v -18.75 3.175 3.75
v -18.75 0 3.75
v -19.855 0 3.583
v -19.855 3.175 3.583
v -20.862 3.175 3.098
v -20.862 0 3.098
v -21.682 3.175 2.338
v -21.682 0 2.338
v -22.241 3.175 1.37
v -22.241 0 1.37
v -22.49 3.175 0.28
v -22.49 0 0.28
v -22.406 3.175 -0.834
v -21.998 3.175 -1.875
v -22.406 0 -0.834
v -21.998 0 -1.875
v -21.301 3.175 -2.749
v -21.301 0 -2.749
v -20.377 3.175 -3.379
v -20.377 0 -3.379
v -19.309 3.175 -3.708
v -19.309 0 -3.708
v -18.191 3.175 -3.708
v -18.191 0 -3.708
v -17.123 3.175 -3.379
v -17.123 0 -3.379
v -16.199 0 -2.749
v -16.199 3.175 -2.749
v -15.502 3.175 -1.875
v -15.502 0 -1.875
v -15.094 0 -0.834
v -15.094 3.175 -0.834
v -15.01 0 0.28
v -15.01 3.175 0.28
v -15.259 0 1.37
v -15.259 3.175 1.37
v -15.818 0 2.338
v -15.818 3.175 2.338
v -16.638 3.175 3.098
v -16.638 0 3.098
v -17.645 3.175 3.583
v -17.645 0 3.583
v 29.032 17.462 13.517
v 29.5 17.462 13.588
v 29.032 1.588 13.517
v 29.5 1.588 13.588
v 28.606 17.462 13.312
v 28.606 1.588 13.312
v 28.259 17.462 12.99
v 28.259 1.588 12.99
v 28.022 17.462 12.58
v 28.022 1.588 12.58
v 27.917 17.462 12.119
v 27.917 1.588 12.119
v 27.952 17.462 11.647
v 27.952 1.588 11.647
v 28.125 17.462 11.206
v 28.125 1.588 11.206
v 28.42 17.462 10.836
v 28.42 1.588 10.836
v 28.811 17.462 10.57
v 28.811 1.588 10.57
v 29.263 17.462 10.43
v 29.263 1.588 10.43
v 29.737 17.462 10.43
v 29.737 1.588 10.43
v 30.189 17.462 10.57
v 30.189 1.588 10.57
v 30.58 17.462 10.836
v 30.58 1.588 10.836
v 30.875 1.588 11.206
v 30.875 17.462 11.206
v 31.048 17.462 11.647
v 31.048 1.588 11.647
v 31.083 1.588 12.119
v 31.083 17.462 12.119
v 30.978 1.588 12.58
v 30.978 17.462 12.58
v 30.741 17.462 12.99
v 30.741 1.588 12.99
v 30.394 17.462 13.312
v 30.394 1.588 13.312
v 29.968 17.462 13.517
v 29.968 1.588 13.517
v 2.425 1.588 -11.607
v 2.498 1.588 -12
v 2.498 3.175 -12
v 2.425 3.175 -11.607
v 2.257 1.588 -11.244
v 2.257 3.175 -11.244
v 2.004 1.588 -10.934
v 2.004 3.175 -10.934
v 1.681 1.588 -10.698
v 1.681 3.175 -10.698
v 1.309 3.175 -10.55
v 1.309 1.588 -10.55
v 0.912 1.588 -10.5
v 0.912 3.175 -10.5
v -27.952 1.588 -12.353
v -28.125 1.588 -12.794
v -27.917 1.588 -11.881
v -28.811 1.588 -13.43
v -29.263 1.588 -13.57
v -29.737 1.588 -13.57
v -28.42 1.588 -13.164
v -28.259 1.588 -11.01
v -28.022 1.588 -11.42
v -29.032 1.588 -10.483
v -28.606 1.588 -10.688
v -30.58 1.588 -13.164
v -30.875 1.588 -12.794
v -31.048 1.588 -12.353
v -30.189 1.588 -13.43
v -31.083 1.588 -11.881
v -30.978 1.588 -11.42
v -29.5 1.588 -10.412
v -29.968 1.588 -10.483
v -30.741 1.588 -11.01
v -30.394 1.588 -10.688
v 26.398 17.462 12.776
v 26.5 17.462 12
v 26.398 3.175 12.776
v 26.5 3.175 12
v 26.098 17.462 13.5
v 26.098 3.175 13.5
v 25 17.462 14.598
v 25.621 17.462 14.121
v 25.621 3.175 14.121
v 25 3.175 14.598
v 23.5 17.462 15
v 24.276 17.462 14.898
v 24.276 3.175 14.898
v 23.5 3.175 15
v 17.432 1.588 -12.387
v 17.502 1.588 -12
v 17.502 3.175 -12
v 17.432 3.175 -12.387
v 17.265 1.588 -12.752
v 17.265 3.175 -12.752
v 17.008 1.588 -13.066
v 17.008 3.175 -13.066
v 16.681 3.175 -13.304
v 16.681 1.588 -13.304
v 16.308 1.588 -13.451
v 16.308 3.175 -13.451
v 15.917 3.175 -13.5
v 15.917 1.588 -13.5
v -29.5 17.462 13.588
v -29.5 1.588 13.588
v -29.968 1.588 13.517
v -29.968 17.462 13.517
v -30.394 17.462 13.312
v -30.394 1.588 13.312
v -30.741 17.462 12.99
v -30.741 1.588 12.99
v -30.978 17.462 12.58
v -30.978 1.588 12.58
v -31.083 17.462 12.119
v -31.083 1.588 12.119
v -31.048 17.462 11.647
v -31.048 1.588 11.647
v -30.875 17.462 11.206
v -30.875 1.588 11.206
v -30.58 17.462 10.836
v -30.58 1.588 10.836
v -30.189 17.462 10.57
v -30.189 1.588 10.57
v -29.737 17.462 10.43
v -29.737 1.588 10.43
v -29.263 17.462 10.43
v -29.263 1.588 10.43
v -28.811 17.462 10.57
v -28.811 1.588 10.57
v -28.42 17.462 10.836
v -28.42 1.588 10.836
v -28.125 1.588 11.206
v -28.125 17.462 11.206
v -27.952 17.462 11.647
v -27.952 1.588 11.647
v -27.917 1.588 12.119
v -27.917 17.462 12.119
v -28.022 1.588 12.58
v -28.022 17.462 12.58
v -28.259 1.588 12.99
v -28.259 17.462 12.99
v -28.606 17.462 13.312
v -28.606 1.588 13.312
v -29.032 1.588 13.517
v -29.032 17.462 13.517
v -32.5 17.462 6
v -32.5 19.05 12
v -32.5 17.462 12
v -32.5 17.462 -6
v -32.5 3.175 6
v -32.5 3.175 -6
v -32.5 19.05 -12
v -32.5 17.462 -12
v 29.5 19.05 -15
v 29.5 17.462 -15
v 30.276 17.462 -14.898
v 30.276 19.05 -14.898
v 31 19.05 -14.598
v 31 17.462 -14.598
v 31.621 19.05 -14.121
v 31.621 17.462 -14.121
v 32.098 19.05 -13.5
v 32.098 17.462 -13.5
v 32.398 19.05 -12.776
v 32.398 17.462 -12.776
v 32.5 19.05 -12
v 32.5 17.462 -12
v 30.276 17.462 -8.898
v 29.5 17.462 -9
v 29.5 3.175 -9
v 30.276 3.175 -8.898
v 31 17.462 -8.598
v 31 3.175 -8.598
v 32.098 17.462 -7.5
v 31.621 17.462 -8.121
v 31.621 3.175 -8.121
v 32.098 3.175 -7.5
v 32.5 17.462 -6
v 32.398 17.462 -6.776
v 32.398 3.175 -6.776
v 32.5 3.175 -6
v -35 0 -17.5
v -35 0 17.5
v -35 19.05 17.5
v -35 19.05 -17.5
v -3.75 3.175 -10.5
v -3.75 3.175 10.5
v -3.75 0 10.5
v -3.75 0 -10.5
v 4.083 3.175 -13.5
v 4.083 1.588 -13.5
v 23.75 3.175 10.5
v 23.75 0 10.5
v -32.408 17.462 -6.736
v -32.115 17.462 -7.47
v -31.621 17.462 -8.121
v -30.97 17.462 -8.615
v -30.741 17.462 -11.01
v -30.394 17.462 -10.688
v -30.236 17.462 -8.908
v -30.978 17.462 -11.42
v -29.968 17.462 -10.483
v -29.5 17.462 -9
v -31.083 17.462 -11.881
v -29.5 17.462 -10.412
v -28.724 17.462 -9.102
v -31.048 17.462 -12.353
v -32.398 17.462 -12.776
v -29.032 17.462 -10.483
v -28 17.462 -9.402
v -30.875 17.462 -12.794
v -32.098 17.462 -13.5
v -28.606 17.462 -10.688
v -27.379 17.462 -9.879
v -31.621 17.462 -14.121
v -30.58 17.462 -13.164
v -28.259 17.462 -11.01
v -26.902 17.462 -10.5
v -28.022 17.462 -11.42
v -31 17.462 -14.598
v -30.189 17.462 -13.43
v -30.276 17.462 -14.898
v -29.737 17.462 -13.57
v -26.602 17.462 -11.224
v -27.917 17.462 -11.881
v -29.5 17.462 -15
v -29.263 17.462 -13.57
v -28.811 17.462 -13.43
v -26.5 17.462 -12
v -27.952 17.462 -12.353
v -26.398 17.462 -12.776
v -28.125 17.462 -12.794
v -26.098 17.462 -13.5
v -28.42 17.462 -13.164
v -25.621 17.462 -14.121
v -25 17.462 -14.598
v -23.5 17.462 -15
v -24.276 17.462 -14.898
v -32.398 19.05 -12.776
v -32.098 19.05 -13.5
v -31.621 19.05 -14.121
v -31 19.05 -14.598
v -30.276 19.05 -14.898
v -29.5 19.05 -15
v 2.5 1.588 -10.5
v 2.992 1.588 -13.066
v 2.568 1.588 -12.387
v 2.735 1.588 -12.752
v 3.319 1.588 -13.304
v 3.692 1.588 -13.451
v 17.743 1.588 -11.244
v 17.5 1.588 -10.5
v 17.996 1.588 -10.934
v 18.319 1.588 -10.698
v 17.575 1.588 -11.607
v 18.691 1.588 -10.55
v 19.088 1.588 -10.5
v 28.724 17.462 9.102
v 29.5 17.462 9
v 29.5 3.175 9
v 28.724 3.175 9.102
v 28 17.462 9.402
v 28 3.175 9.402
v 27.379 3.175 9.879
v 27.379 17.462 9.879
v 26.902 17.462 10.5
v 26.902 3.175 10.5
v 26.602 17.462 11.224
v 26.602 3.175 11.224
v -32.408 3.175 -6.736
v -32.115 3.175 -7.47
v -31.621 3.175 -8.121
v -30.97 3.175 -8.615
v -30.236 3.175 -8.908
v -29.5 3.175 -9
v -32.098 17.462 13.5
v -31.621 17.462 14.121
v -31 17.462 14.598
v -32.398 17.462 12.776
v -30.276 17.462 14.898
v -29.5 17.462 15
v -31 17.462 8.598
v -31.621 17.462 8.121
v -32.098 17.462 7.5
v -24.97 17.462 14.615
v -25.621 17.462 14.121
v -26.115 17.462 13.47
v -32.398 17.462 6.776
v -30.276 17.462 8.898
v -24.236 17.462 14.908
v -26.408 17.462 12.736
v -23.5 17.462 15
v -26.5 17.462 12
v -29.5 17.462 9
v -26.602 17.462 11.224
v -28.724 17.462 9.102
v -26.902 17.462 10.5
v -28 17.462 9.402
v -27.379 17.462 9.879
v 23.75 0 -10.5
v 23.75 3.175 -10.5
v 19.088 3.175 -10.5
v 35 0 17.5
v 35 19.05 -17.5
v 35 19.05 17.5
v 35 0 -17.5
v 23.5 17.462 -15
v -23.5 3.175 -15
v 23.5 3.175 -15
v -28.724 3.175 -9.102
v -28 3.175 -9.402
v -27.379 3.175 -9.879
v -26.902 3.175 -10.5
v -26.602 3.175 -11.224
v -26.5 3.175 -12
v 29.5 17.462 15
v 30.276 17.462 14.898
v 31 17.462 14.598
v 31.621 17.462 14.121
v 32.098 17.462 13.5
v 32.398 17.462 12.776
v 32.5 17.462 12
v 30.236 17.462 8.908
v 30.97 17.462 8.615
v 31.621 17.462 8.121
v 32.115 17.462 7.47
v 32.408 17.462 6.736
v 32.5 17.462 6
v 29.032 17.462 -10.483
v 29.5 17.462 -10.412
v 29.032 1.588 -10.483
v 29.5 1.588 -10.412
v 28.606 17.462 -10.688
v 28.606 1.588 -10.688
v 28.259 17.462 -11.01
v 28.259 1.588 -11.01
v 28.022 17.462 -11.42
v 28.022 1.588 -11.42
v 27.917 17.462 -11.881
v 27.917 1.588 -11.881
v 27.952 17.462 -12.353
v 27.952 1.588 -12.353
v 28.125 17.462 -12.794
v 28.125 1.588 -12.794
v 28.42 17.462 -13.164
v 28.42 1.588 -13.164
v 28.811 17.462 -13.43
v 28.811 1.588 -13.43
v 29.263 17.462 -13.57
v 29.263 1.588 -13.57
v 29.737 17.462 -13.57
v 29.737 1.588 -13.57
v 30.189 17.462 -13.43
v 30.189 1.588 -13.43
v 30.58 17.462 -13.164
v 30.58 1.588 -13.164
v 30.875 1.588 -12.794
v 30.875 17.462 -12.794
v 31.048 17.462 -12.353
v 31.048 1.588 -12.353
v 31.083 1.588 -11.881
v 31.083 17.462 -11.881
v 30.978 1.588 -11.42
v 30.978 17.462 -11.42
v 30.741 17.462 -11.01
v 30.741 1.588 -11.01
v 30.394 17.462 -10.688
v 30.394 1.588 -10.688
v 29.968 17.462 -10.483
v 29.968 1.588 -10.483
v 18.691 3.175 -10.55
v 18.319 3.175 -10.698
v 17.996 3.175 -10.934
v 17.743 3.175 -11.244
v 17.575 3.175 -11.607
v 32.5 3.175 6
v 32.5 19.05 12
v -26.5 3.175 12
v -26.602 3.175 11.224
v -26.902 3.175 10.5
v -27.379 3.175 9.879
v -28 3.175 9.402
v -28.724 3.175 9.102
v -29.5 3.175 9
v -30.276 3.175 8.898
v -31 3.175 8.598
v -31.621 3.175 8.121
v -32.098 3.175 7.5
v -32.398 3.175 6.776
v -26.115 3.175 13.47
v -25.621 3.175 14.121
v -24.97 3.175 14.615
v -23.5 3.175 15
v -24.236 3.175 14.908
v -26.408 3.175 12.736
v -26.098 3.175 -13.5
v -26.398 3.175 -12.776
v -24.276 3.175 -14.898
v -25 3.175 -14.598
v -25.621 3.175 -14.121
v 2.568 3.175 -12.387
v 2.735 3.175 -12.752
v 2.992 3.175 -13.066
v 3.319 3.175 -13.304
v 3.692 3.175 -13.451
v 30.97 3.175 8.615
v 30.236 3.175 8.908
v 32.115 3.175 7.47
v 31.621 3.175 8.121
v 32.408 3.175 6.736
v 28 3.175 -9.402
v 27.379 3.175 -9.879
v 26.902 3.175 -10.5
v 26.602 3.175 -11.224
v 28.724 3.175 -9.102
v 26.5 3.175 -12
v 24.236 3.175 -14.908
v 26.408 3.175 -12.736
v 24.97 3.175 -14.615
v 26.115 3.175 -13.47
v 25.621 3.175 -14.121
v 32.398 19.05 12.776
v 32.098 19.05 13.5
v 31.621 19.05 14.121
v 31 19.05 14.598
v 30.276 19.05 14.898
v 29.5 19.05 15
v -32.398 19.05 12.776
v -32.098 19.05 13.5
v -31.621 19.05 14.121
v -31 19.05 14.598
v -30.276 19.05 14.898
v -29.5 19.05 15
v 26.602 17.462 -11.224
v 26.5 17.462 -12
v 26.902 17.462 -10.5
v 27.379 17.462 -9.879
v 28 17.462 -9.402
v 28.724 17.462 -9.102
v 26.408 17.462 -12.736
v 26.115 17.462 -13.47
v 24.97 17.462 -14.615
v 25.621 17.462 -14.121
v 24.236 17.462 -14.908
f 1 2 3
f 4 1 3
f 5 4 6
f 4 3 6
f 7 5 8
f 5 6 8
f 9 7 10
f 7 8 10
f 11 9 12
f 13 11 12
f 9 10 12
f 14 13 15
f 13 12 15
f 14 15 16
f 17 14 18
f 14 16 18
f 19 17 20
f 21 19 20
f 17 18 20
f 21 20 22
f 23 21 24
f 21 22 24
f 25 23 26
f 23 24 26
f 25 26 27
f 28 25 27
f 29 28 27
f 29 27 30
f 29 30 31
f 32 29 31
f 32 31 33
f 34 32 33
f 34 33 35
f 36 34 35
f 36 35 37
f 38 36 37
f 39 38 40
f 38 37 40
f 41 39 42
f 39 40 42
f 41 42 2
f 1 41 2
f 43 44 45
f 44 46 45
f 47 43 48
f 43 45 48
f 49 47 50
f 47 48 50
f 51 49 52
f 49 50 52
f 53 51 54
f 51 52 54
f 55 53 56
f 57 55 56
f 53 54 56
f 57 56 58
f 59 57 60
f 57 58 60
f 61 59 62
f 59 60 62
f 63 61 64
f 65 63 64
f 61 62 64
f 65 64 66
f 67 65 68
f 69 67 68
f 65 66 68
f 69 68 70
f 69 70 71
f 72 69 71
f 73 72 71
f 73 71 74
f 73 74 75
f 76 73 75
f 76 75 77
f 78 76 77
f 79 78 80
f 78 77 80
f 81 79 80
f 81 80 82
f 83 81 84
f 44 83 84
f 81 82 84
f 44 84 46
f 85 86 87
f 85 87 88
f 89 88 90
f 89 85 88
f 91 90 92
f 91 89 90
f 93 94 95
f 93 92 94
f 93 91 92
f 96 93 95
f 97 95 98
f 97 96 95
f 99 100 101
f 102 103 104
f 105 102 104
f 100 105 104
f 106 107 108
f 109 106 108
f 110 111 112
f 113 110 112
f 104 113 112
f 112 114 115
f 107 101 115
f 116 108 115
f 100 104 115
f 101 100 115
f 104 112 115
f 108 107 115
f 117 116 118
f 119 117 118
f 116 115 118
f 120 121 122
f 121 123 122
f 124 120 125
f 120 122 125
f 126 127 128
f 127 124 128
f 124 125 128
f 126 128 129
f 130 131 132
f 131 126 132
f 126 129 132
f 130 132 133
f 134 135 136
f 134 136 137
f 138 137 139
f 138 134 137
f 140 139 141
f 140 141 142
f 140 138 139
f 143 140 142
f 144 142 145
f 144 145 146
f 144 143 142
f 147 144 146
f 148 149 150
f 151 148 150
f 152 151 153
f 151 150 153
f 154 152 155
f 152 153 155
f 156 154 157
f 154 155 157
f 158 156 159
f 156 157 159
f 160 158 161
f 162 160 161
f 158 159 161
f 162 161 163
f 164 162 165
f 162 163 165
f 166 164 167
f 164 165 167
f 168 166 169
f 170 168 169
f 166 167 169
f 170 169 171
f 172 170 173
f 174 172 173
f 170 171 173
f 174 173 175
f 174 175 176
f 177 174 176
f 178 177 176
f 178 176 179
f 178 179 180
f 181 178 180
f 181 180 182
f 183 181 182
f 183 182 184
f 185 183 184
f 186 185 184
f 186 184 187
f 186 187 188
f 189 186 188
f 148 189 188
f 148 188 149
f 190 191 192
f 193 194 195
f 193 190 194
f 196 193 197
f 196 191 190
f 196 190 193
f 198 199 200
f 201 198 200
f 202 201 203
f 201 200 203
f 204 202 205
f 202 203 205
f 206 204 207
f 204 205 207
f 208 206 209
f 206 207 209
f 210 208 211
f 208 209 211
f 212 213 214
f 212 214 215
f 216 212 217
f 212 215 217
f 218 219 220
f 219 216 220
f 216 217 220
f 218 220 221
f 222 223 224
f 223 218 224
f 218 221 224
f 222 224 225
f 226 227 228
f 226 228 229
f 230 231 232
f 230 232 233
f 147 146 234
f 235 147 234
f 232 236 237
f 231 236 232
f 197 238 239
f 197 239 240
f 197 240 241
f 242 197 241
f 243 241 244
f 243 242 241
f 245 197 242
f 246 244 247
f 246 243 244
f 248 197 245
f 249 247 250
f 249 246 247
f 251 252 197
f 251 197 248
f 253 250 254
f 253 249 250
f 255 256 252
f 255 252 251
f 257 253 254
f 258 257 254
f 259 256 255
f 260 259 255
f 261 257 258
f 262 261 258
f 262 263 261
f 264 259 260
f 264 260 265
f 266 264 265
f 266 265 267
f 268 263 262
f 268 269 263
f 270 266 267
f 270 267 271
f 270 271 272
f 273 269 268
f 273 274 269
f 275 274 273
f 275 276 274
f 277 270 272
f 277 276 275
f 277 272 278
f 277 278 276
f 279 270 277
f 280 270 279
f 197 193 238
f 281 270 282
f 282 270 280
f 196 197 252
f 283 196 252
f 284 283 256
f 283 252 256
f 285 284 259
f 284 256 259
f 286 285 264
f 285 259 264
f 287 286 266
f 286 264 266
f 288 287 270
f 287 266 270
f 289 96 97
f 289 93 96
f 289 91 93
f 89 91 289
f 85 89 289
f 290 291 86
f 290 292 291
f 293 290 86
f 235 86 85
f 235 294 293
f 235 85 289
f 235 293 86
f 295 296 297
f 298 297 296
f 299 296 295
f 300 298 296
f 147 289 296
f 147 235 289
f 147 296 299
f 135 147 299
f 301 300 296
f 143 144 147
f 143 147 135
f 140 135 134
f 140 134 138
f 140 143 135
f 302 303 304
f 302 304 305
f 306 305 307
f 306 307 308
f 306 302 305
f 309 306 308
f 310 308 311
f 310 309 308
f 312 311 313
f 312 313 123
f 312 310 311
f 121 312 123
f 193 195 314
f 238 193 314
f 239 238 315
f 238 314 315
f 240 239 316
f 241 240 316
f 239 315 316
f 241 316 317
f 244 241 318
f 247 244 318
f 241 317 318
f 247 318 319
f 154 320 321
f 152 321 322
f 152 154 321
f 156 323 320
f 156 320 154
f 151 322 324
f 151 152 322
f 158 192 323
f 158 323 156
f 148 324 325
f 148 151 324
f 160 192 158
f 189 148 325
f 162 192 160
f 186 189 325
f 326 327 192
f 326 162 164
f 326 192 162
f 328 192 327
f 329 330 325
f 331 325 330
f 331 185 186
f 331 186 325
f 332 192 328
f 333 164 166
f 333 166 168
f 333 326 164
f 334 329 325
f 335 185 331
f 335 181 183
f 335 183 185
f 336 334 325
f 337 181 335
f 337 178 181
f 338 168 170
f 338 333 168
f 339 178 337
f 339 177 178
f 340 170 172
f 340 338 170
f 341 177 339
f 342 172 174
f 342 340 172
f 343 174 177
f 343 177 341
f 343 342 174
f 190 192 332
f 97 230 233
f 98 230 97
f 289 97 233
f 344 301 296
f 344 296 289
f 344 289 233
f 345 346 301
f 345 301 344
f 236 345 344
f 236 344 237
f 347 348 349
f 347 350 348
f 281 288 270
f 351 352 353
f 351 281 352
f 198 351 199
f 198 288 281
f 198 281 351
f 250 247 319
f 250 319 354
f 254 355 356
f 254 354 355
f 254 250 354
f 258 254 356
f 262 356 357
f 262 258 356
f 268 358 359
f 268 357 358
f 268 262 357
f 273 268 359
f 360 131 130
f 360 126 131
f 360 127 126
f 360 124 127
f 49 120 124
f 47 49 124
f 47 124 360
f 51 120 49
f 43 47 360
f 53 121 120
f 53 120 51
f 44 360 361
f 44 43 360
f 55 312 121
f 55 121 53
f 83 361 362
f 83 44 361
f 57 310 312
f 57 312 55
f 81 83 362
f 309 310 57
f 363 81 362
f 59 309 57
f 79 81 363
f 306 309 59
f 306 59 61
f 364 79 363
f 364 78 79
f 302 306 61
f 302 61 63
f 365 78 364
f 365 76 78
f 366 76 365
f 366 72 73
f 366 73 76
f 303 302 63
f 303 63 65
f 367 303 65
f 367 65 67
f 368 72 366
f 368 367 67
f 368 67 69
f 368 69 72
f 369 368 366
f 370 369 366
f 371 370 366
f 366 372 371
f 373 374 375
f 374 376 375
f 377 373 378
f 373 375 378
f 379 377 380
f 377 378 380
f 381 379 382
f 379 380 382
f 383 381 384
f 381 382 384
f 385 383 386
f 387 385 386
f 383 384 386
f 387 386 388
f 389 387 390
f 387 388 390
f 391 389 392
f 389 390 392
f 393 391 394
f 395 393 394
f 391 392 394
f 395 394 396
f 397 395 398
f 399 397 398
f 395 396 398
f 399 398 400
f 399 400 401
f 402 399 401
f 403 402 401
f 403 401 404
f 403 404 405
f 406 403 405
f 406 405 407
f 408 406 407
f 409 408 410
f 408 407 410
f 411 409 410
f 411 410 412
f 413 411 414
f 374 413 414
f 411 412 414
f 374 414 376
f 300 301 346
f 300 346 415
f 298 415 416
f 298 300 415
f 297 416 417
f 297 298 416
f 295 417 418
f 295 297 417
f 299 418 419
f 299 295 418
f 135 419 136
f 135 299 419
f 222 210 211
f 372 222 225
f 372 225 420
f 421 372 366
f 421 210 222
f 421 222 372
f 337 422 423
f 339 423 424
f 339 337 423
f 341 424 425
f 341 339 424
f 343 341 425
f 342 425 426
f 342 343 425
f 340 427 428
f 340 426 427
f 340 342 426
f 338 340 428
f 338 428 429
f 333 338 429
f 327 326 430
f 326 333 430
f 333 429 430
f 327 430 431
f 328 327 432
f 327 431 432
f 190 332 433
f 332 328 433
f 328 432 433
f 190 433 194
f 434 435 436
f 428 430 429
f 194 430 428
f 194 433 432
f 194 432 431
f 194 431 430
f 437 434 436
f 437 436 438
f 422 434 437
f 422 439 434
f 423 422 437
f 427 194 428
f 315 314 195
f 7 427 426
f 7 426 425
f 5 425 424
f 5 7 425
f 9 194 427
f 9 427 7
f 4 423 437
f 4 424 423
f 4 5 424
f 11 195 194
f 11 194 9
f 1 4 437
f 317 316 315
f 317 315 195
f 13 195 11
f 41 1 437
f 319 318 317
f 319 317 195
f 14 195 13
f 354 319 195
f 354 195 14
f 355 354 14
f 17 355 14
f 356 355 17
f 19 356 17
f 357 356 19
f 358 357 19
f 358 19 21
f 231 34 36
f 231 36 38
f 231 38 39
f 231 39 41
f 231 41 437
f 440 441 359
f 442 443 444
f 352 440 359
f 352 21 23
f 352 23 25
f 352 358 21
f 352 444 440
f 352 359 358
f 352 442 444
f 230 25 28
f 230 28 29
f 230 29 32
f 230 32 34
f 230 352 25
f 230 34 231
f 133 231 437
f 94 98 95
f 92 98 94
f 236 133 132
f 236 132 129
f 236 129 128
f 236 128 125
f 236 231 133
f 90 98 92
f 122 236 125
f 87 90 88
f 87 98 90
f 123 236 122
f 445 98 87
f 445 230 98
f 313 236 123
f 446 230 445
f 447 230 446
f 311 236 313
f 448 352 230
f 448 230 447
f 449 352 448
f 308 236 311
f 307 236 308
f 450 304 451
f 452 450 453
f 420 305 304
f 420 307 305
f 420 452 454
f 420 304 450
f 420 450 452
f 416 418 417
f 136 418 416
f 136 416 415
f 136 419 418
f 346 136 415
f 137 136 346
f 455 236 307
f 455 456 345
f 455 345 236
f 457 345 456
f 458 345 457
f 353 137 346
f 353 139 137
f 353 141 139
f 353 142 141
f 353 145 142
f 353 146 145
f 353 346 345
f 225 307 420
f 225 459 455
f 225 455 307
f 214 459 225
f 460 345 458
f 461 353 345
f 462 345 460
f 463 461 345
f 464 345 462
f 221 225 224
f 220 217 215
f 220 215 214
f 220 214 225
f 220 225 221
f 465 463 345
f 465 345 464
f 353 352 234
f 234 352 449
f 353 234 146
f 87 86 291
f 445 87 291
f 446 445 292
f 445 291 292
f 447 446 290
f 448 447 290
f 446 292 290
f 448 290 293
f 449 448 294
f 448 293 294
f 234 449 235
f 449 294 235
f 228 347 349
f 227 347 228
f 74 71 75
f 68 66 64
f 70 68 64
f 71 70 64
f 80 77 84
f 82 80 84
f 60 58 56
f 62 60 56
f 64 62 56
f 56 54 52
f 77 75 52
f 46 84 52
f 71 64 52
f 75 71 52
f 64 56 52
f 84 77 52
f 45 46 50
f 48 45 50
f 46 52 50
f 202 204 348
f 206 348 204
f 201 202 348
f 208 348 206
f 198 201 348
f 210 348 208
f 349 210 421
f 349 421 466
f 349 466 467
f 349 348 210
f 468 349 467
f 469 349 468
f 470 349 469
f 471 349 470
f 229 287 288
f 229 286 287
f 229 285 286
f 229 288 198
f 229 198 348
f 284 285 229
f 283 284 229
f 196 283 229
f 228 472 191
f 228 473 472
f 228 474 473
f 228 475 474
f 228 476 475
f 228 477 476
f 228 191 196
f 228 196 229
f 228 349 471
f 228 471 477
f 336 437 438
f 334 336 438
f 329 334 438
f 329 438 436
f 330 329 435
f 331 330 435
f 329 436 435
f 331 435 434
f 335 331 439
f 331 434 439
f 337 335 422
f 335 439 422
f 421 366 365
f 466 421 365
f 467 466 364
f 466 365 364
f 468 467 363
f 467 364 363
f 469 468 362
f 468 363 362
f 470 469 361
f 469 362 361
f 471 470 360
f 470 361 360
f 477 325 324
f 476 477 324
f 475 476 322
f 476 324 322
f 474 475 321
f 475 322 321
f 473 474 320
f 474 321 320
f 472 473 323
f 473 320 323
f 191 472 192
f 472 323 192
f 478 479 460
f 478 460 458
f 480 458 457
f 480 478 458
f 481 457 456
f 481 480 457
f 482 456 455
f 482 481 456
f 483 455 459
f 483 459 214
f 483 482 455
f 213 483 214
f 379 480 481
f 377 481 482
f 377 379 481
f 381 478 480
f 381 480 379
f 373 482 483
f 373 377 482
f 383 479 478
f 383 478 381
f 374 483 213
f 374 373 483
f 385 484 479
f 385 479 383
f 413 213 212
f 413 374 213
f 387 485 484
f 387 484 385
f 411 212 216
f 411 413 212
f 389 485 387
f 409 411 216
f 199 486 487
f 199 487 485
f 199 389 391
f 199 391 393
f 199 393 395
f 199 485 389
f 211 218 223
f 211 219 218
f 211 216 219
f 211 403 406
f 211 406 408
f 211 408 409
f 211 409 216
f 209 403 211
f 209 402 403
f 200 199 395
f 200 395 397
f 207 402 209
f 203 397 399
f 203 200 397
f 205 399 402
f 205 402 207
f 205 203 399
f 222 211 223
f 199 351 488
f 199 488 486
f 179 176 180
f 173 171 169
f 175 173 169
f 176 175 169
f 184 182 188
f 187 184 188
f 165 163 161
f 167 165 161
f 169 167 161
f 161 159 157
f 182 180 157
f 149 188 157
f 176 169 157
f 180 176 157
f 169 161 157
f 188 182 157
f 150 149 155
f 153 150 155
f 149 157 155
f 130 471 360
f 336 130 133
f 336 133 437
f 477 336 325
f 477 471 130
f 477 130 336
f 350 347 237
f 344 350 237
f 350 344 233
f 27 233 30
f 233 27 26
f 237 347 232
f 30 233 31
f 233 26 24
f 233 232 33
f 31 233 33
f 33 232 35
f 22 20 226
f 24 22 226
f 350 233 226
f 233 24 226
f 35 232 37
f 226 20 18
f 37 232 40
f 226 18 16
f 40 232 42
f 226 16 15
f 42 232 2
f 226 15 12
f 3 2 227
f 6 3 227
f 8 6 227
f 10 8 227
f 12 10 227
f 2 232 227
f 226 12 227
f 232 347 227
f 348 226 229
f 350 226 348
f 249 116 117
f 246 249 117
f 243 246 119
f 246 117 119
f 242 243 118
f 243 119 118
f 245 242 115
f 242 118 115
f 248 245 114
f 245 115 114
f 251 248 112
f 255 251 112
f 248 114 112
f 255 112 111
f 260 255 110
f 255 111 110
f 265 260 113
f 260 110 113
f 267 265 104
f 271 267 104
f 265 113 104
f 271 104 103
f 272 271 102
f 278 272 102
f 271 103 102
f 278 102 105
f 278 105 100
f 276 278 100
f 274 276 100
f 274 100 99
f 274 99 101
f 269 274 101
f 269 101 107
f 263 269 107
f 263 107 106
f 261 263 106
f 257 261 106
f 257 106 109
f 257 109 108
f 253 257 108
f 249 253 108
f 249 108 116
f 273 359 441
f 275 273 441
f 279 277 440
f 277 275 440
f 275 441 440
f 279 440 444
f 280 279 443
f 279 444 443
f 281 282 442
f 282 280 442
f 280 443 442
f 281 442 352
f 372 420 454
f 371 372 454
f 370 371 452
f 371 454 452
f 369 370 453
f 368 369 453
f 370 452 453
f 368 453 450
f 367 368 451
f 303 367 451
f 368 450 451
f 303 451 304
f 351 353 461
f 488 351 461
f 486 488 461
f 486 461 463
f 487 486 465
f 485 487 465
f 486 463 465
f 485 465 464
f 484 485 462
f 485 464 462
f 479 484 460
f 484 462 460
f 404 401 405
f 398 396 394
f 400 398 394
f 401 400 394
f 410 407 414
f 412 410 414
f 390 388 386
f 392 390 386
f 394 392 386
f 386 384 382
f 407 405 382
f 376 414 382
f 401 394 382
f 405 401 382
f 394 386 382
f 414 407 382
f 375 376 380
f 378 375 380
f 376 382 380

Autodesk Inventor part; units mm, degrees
ref_plane "YZ Plane" through (0, 0, 0) normal (1, 0, 0) x (0, 1, 0)
ref_plane "XZ Plane" through (0, 0, 0) normal (0, 1, 0) x (-1, 0, 0)
ref_plane "XY Plane" through (0, 0, 0) normal (0, 0, 1) x (1, 0, 0)
sketch "Sketch1" plane through (0, 0, 0) normal (0, 1, 0) x (-1, 0, 0)
  line L0 (35, -17.5) -> (-35, -17.5)
  line L1 (-35, -17.5) -> (-35, 17.5)
  line L2 (-35, 17.5) -> (35, 17.5)
  line L3 (35, 17.5) -> (35, -17.5)
  line L4 (35, -17.5) -> (-35, 17.5) construction
  line L5 (-35, -17.5) -> (35, 17.5) construction
  point P0 (0, 0)
  dimension "d0" = 70
  dimension "d1" = 35
extrude "Extrusion1" add sketch "Sketch1" along normal blind 19.05
sketch "Sketch2" plane through (0, 19.05, 0) normal (0, 1, 0) x (1, 0, 0)
  line L0 (32.5, -15) -> (-32.5, -15)
  line L1 (-32.5, -15) -> (-32.5, 15)
  line L2 (-32.5, 15) -> (32.5, 15)
  line L3 (32.5, 15) -> (32.5, -15)
  line L4 (32.5, -15) -> (-32.5, 15) construction
  line L5 (-32.5, -15) -> (32.5, 15) construction
  point P0 (0, 0)
  dimension "d4" = 65
  dimension "d5" = 30
extrude "Extrusion2" cut sketch "Sketch2" against normal blind 1.5875
fillet "Fillet1" radius 3 4 edges at (-32.5, 18.2563, -15) (-32.5, 18.2563, 15) (32.5, 18.2563, -15) (32.5, 18.2563, 15)
sketch "Sketch3" plane through (0, 17.4625, 0) normal (0, 1, 0) x (1, 0, 0)
  arc A0 (-29.5, 15) -> (-32.5, 12) centre (-29.5, 12) ccw projected
  arc A1 (-32.5, -12) -> (-29.5, -15) centre (-29.5, -12) ccw projected
  arc A2 (29.5, -15) -> (32.5, -12) centre (29.5, -12) ccw projected
  arc A3 (32.5, 12) -> (29.5, 15) centre (29.5, 12) ccw projected
  point P0 (0, 0)
hole "Hole1" at (-29.5, 17.4625, -12) at (-29.5, 17.4625, 12) at (29.5, 17.4625, 12) at (29.5, 17.4625, -12) direction (0, -1, 0) diameter 3.175 depth 15.875
sketch "Sketch4" plane through (0, 17.4625, 0) normal (0, 1, 0) x (1, 0, 0)
  circle A0 centre (-29.5, 12) radius 1.5875 construction
  circle A1 centre (-29.5, 12) radius 3
  circle A2 centre (-29.5, -12) radius 1.5875 construction
  circle A3 centre (-29.5, -12) radius 3
  circle A4 centre (29.5, -12) radius 1.5875 construction
  arc A5 (29.5, -15) -> (32.5, -12) centre (29.5, -12) ccw projected
  circle A6 centre (29.5, -12) radius 3
  circle A7 centre (29.5, 12) radius 1.5875 construction
  circle A8 centre (29.5, 12) radius 3
  arc A9 (-29.5, 15) -> (-32.5, 12) centre (-29.5, 12) ccw projected
  arc A10 (-32.5, -12) -> (-29.5, -15) centre (-29.5, -12) ccw projected
  arc A11 (32.5, 12) -> (29.5, 15) centre (29.5, 12) ccw projected
  line L0 (-29.5, 15) -> (29.5, 15) projected
  line L1 (-29.5, 15) -> (29.5, 15)
  line L2 (-35, 17.5) -> (35, 17.5) projected
  line L3 (-32.5, -12) -> (-32.5, 12) projected
  line L4 (-32.5, 12) -> (-32.5, -12)
  arc A12 (-32.5, -12) -> (-29.5, -15) centre (-29.5, -12) ccw projected
  line L5 (-29.5, -15) -> (29.5, -15)
  line L6 (32.5, 12) -> (32.5, -12) projected
  line L7 (32.5, 12) -> (32.5, -12)
  point P0 (0, 0)
  point P1 (-29.5, -9)
  point P2 (-26.5, -12)
  point P3 (-29.5, 9)
  point P4 (-26.5, 12)
  point P5 (26.5, 12)
  point P6 (29.5, 9)
  point P7 (26.5, -12)
  point P8 (29.5, -9)
extrude "Extrusion3" cut sketch "Sketch4" against normal blind 14.2875 contours A1 L0 A8 L6 A6 L5 A3 L3
fillet "Fillet3" radius 3 8 edges at (-32.5, 10.3188, -12) (-29.5, 10.3188, -15) (-32.5, 10.3188, 12) (-29.5, 10.3188, 15) (29.5, 10.3188, 15) (32.5, 10.3188, 12) (29.5, 10.3188, -15) (32.5, 10.3188, -12)
sketch "Sketch6" plane through (0, 3.175, 0) normal (0, 1, 0) x (1, 0, 0)
  line L0 (-3.75, 10.5) -> (23.75, 10.5)
  line L1 (23.75, 10.5) -> (23.75, -10.5)
  line L2 (23.75, -10.5) -> (-3.75, -10.5)
  line L3 (-3.75, -10.5) -> (-3.75, 10.5)
  line L4 (-3.75, 10.5) -> (23.75, -10.5) construction
  line L5 (23.75, 10.5) -> (-3.75, -10.5) construction
  line L6 (-3.5, 14) -> (23.5, 14) construction
  line L7 (23.5, 14) -> (23.5, -14) construction
  line L8 (23.5, -14) -> (-3.5, -14) construction
  line L9 (-3.5, -14) -> (-3.5, 14) construction
  line L10 (-3.5, 14) -> (23.5, -14) construction
  line L11 (23.5, 14) -> (-3.5, -14) construction
  point P0 (0, 0)
  point P1 (10, 0)
  point P2 (10, 0)
  point P3 (10, 0)
  dimension "d22" = 27.5
  dimension "d23" = 21
  dimension "d24" = 27
  dimension "d25" = 28
  dimension "d26" = 10
extrude "Extrusion4" cut sketch "Sketch6" against normal through all
sketch "Sketch7" plane through (0, 3.175, 0) normal (0, 1, 0) x (1, 0, 0)
  line L0 (-3.75, -10.5) -> (-3.75, 10.5) projected
  point P0 (0, 0)
  point P1 (-18.75, 0)
  dimension "d37" = 15
hole "Hole2" at (-18.75, 3.175, 0) direction (0, -1, 0) diameter 7.5 end through all
sketch "Sketch8" plane through (0, 3.175, 0) normal (0, 1, 0) x (1, 0, 0)
  line L0 (17.5, 13.5) -> (2.5, 13.5)
  line L1 (2.5, 13.5) -> (2.5, 10.5)
  line L2 (2.5, 10.5) -> (17.5, 10.5)
  line L3 (17.5, 10.5) -> (17.5, 13.5)
  line L4 (-3.75, 10.5) -> (23.75, 10.5) projected
  point P0 (0, 0)
  point P1 (10, 13.5)
  point P2 (10, 10.5)
  point P3 (10, 10.5)
  dimension "d38" = 3
  dimension "d39" = 15
extrude "Extrusion5" cut sketch "Sketch8" against normal blind 1.5875
fillet "Fillet5" radius 1.5875 4 edges at (2.5, 2.3812, -13.5) (2.5, 2.3812, -10.5) (17.5, 2.3812, -13.5) (17.5, 2.3812, -10.5)
properties part number "Display Case" material "Wood (Walnut)"
